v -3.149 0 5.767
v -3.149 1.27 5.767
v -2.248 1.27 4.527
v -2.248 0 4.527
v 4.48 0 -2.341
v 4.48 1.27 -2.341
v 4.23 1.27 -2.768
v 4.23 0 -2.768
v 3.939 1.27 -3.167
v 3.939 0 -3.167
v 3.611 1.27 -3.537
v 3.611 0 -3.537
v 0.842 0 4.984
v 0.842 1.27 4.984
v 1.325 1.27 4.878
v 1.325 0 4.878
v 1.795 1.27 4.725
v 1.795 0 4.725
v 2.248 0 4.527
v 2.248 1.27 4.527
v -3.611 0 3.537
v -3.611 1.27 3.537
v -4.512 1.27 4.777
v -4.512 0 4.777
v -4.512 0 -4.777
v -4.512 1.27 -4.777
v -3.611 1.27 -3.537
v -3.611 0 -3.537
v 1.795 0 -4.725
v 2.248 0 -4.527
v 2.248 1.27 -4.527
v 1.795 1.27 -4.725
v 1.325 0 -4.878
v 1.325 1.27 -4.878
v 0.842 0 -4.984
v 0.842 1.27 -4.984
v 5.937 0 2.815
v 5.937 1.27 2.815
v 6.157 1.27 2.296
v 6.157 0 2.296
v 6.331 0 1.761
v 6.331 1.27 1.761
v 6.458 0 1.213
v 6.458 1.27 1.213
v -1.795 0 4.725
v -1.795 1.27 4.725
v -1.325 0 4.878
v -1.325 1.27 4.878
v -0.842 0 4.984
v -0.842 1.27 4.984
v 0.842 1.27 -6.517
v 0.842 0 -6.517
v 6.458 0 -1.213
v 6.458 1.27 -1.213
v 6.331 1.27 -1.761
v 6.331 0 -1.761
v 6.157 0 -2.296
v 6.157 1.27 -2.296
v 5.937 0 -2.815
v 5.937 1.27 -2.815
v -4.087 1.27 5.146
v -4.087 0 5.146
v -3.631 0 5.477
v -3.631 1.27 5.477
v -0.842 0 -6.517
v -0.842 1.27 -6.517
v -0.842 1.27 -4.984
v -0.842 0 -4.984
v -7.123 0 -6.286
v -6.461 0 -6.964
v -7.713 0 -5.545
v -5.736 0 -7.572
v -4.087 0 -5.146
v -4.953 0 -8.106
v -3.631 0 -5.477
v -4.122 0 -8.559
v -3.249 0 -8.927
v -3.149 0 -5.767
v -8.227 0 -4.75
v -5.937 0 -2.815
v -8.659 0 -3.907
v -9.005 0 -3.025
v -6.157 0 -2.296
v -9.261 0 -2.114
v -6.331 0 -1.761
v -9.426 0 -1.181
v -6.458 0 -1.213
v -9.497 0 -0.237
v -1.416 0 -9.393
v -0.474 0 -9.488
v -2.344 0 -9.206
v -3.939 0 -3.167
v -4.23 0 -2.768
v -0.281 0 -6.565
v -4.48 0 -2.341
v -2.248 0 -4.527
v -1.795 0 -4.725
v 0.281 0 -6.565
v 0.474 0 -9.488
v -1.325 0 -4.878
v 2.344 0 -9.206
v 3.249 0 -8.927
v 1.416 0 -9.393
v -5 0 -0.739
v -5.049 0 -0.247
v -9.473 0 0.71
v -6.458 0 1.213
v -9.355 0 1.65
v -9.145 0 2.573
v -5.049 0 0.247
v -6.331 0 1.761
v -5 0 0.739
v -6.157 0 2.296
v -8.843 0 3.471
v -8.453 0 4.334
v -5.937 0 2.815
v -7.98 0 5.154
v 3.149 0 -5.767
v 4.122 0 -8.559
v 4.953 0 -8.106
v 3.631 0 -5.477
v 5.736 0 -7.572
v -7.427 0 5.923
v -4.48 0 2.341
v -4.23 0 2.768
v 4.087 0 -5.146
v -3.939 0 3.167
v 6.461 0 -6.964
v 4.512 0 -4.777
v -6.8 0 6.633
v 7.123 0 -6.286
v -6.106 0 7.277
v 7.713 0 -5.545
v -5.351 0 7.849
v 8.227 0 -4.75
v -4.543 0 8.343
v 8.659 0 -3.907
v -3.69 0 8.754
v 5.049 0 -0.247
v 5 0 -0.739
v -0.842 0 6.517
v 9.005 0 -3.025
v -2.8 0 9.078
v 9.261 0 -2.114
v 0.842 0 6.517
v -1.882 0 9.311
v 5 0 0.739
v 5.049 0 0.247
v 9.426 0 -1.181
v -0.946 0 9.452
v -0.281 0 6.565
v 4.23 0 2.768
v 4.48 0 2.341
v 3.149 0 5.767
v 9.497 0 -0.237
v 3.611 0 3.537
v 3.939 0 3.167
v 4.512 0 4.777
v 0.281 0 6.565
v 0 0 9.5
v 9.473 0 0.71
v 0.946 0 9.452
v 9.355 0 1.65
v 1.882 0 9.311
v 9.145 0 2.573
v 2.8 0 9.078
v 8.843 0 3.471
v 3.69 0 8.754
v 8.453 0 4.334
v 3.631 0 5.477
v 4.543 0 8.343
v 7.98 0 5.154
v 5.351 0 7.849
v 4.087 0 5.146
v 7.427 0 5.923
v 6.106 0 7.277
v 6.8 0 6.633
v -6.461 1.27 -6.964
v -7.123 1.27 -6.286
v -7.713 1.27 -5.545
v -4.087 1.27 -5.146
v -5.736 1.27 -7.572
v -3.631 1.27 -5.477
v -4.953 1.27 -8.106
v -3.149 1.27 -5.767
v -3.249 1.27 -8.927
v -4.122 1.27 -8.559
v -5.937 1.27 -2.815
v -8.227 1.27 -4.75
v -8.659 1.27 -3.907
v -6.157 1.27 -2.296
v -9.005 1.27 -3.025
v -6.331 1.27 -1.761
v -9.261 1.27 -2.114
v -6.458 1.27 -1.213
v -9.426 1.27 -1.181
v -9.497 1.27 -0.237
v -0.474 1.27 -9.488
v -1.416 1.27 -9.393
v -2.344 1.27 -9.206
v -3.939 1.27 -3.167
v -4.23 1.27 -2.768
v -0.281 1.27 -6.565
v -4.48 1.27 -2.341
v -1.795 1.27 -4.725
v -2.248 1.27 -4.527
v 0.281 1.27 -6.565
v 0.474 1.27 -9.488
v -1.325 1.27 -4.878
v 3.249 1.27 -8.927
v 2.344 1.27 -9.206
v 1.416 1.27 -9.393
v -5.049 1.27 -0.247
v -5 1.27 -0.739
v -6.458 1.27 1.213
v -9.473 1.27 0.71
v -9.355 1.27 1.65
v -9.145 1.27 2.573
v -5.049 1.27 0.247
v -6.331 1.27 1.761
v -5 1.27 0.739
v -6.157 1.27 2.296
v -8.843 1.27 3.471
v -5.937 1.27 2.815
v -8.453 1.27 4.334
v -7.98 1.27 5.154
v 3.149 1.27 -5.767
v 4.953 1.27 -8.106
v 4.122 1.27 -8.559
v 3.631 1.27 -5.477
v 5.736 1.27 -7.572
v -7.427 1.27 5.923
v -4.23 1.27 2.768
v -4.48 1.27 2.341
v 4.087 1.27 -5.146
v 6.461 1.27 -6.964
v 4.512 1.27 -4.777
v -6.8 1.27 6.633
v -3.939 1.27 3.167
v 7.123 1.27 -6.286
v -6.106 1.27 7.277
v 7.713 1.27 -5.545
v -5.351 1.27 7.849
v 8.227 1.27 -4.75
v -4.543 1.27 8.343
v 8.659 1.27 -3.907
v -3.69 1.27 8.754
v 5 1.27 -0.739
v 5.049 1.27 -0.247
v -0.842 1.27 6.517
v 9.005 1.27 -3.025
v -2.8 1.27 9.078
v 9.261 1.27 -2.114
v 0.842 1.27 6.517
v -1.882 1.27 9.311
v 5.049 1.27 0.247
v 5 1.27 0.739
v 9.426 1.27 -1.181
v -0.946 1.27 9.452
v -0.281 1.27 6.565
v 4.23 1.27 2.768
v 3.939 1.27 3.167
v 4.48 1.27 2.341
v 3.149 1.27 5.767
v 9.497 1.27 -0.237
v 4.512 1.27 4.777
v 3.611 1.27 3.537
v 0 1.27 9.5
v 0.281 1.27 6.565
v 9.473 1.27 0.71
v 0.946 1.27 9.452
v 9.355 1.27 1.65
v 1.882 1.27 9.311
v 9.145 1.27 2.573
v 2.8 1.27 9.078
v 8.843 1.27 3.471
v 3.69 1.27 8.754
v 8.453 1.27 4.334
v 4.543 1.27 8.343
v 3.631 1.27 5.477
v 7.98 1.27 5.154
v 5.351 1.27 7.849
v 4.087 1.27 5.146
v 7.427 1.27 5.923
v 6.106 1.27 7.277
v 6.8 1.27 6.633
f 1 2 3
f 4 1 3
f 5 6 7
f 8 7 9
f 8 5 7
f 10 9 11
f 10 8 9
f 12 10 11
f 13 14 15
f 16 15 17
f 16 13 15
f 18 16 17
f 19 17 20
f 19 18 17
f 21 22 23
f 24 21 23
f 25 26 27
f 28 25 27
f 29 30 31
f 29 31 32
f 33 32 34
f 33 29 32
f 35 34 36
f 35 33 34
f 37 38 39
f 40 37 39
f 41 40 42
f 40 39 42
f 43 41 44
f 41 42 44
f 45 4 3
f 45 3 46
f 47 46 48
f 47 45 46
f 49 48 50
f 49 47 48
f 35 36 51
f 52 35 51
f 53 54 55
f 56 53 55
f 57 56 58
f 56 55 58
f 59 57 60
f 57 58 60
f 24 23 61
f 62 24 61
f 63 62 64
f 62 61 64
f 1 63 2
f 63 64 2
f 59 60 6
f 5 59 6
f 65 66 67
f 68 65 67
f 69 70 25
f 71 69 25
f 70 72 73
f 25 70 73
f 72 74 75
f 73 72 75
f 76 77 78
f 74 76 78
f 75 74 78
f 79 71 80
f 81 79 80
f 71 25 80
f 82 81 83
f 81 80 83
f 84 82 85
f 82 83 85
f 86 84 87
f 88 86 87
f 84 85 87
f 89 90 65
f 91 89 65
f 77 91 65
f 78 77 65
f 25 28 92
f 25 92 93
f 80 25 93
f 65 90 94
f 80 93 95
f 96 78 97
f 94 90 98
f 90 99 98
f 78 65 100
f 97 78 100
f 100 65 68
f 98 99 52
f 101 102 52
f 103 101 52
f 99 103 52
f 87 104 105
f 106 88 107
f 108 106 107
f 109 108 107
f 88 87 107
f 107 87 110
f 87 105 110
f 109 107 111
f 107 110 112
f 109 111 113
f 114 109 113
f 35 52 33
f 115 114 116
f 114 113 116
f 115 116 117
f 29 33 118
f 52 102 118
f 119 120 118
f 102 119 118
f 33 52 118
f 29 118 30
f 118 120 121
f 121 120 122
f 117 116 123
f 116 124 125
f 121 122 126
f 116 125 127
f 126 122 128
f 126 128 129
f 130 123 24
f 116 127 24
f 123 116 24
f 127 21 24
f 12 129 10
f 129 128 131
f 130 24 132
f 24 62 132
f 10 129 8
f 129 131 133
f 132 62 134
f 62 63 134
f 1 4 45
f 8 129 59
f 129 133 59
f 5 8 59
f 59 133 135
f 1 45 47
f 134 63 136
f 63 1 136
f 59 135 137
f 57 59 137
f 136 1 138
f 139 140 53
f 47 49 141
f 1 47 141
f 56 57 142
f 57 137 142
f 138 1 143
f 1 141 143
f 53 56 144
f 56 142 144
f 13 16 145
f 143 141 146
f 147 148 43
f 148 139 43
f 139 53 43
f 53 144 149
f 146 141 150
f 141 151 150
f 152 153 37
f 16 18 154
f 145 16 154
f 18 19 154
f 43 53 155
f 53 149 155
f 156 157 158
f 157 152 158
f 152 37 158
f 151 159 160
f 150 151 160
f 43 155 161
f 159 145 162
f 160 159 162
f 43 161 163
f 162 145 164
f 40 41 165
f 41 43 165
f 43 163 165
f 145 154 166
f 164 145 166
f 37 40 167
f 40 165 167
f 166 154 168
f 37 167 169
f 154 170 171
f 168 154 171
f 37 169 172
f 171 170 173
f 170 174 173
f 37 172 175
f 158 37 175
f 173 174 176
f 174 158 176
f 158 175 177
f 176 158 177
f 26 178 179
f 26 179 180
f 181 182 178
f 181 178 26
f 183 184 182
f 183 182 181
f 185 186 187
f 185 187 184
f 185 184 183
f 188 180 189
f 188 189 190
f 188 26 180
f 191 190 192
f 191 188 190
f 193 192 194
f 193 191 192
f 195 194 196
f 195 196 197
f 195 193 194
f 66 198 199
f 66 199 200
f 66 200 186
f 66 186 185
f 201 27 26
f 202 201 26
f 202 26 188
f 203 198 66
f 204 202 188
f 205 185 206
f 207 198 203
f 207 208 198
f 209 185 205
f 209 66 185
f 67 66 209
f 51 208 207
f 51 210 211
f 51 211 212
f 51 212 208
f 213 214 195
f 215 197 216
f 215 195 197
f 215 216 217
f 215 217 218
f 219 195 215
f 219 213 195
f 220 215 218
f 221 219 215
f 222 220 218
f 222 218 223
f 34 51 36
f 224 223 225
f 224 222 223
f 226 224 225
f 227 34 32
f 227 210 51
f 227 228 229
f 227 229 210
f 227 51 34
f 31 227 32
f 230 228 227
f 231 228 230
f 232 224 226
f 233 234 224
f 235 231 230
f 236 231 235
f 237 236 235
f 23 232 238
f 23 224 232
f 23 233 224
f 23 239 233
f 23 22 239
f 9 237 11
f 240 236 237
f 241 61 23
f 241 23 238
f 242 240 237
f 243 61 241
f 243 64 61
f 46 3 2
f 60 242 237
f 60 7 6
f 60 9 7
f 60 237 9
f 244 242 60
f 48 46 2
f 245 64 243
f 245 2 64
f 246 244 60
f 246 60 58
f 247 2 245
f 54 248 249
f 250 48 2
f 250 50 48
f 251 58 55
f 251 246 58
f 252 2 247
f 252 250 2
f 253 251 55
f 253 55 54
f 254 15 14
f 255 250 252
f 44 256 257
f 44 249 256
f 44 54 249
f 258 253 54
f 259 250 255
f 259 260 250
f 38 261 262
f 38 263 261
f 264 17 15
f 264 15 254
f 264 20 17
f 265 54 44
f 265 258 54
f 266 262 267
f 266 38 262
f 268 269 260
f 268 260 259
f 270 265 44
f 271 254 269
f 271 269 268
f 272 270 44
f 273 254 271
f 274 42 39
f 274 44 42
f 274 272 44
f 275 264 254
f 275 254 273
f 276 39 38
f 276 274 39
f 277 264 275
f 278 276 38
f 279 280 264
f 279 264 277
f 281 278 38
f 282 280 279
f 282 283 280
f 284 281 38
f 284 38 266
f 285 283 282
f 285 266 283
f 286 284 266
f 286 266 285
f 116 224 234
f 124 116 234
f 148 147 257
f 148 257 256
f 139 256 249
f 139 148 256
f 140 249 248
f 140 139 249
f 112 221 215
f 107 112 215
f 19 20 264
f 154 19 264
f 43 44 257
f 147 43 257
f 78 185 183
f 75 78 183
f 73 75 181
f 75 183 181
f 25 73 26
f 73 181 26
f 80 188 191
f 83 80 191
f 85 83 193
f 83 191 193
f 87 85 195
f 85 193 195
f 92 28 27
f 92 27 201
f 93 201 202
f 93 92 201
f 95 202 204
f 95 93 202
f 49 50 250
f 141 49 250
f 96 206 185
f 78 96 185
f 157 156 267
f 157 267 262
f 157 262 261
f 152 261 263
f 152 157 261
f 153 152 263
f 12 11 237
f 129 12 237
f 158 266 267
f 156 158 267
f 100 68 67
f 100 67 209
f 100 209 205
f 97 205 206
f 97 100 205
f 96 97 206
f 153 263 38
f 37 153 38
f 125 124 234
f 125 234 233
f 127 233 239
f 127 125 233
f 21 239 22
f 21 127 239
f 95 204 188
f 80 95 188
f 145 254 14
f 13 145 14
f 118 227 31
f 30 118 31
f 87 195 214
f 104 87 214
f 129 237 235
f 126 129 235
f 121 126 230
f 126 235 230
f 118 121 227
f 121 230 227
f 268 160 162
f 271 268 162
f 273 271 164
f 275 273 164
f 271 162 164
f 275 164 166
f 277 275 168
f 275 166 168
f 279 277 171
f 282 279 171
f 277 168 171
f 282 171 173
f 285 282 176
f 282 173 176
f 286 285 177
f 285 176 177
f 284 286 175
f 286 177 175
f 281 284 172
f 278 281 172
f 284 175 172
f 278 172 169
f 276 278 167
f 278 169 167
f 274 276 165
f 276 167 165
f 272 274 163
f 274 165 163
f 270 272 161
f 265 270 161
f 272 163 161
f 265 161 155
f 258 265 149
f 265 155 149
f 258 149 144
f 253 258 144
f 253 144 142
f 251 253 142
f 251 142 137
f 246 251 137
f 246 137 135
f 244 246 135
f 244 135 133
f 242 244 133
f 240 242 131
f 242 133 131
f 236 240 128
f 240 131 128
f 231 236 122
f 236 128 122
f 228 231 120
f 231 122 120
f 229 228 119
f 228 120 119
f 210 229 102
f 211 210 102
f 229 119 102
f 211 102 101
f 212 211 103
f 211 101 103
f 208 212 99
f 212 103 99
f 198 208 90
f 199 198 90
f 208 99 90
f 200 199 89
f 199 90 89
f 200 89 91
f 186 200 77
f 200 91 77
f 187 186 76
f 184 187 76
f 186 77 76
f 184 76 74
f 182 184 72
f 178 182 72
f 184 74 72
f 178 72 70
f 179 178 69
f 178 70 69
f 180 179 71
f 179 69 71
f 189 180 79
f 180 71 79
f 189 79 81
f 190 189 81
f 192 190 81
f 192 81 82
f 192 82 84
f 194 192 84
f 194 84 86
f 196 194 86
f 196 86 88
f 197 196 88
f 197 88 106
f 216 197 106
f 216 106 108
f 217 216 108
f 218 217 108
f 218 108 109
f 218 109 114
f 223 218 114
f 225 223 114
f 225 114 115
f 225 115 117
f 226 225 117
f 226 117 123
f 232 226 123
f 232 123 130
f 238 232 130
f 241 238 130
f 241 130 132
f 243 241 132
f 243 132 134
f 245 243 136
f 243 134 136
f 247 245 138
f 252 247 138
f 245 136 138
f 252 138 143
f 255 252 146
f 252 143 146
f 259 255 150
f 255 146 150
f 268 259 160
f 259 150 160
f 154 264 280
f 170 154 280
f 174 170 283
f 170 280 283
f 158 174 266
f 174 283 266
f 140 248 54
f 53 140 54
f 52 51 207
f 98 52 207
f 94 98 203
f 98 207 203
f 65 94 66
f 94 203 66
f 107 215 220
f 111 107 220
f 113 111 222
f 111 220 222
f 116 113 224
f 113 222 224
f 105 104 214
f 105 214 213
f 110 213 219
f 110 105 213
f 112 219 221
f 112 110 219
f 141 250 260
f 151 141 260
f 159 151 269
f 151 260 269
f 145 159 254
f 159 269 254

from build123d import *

# Parameters (mm, degrees)
SKETCH1_R          = 9.4996
SKETCH1_R_2        = 5.0546
EXTRUDE1_DEPTH     = 1.27
CUT_EXTRUDE1_DEPTH = 14.494358092
CIRPATTERN1_COUNT  = 10


with BuildPart() as part:
    # Sketch1 → Extrude1 (new body)
    with BuildSketch(Plane(origin=(0, 0, 0), x_dir=(1, 0, 0), z_dir=(0, 1, 0))):
        Circle(SKETCH1_R)
        Circle(SKETCH1_R_2, mode=Mode.SUBTRACT)
    extrude(amount=EXTRUDE1_DEPTH)

    # Sketch2 → Cut-Extrude1 (cut, through all)
    with BuildSketch(Plane(origin=(0, 1.27, 0), x_dir=(-1, 0, 0), z_dir=(0, 1, 0))):
        with BuildLine():
            Line((-0.842433333, 6.516754118), (-0.842433333, 4.983902812))
            ThreePointArc((-0.842433333, 4.983902812), (0, 5.0546), (0.842433333, 4.983902812))
            Line((0.842433333, 4.983902812), (0.842433333, 6.516754118))
            ThreePointArc((0.842433333, 6.516754118), (0, 6.57098), (-0.842433333, 6.516754118))
        make_face()
    cut_extrude1 = extrude(amount=-CUT_EXTRUDE1_DEPTH, mode=Mode.SUBTRACT)

    # CirPattern1: Cut-Extrude1 ×10 about axis
    cirpattern1_axis = Axis((0, 8.866745684, 0), (0, -1, 0))
    for i in range(1, CIRPATTERN1_COUNT):
        add(cut_extrude1.rotate(cirpattern1_axis, i * 360 / CIRPATTERN1_COUNT), mode=Mode.SUBTRACT)


solid = part.part
